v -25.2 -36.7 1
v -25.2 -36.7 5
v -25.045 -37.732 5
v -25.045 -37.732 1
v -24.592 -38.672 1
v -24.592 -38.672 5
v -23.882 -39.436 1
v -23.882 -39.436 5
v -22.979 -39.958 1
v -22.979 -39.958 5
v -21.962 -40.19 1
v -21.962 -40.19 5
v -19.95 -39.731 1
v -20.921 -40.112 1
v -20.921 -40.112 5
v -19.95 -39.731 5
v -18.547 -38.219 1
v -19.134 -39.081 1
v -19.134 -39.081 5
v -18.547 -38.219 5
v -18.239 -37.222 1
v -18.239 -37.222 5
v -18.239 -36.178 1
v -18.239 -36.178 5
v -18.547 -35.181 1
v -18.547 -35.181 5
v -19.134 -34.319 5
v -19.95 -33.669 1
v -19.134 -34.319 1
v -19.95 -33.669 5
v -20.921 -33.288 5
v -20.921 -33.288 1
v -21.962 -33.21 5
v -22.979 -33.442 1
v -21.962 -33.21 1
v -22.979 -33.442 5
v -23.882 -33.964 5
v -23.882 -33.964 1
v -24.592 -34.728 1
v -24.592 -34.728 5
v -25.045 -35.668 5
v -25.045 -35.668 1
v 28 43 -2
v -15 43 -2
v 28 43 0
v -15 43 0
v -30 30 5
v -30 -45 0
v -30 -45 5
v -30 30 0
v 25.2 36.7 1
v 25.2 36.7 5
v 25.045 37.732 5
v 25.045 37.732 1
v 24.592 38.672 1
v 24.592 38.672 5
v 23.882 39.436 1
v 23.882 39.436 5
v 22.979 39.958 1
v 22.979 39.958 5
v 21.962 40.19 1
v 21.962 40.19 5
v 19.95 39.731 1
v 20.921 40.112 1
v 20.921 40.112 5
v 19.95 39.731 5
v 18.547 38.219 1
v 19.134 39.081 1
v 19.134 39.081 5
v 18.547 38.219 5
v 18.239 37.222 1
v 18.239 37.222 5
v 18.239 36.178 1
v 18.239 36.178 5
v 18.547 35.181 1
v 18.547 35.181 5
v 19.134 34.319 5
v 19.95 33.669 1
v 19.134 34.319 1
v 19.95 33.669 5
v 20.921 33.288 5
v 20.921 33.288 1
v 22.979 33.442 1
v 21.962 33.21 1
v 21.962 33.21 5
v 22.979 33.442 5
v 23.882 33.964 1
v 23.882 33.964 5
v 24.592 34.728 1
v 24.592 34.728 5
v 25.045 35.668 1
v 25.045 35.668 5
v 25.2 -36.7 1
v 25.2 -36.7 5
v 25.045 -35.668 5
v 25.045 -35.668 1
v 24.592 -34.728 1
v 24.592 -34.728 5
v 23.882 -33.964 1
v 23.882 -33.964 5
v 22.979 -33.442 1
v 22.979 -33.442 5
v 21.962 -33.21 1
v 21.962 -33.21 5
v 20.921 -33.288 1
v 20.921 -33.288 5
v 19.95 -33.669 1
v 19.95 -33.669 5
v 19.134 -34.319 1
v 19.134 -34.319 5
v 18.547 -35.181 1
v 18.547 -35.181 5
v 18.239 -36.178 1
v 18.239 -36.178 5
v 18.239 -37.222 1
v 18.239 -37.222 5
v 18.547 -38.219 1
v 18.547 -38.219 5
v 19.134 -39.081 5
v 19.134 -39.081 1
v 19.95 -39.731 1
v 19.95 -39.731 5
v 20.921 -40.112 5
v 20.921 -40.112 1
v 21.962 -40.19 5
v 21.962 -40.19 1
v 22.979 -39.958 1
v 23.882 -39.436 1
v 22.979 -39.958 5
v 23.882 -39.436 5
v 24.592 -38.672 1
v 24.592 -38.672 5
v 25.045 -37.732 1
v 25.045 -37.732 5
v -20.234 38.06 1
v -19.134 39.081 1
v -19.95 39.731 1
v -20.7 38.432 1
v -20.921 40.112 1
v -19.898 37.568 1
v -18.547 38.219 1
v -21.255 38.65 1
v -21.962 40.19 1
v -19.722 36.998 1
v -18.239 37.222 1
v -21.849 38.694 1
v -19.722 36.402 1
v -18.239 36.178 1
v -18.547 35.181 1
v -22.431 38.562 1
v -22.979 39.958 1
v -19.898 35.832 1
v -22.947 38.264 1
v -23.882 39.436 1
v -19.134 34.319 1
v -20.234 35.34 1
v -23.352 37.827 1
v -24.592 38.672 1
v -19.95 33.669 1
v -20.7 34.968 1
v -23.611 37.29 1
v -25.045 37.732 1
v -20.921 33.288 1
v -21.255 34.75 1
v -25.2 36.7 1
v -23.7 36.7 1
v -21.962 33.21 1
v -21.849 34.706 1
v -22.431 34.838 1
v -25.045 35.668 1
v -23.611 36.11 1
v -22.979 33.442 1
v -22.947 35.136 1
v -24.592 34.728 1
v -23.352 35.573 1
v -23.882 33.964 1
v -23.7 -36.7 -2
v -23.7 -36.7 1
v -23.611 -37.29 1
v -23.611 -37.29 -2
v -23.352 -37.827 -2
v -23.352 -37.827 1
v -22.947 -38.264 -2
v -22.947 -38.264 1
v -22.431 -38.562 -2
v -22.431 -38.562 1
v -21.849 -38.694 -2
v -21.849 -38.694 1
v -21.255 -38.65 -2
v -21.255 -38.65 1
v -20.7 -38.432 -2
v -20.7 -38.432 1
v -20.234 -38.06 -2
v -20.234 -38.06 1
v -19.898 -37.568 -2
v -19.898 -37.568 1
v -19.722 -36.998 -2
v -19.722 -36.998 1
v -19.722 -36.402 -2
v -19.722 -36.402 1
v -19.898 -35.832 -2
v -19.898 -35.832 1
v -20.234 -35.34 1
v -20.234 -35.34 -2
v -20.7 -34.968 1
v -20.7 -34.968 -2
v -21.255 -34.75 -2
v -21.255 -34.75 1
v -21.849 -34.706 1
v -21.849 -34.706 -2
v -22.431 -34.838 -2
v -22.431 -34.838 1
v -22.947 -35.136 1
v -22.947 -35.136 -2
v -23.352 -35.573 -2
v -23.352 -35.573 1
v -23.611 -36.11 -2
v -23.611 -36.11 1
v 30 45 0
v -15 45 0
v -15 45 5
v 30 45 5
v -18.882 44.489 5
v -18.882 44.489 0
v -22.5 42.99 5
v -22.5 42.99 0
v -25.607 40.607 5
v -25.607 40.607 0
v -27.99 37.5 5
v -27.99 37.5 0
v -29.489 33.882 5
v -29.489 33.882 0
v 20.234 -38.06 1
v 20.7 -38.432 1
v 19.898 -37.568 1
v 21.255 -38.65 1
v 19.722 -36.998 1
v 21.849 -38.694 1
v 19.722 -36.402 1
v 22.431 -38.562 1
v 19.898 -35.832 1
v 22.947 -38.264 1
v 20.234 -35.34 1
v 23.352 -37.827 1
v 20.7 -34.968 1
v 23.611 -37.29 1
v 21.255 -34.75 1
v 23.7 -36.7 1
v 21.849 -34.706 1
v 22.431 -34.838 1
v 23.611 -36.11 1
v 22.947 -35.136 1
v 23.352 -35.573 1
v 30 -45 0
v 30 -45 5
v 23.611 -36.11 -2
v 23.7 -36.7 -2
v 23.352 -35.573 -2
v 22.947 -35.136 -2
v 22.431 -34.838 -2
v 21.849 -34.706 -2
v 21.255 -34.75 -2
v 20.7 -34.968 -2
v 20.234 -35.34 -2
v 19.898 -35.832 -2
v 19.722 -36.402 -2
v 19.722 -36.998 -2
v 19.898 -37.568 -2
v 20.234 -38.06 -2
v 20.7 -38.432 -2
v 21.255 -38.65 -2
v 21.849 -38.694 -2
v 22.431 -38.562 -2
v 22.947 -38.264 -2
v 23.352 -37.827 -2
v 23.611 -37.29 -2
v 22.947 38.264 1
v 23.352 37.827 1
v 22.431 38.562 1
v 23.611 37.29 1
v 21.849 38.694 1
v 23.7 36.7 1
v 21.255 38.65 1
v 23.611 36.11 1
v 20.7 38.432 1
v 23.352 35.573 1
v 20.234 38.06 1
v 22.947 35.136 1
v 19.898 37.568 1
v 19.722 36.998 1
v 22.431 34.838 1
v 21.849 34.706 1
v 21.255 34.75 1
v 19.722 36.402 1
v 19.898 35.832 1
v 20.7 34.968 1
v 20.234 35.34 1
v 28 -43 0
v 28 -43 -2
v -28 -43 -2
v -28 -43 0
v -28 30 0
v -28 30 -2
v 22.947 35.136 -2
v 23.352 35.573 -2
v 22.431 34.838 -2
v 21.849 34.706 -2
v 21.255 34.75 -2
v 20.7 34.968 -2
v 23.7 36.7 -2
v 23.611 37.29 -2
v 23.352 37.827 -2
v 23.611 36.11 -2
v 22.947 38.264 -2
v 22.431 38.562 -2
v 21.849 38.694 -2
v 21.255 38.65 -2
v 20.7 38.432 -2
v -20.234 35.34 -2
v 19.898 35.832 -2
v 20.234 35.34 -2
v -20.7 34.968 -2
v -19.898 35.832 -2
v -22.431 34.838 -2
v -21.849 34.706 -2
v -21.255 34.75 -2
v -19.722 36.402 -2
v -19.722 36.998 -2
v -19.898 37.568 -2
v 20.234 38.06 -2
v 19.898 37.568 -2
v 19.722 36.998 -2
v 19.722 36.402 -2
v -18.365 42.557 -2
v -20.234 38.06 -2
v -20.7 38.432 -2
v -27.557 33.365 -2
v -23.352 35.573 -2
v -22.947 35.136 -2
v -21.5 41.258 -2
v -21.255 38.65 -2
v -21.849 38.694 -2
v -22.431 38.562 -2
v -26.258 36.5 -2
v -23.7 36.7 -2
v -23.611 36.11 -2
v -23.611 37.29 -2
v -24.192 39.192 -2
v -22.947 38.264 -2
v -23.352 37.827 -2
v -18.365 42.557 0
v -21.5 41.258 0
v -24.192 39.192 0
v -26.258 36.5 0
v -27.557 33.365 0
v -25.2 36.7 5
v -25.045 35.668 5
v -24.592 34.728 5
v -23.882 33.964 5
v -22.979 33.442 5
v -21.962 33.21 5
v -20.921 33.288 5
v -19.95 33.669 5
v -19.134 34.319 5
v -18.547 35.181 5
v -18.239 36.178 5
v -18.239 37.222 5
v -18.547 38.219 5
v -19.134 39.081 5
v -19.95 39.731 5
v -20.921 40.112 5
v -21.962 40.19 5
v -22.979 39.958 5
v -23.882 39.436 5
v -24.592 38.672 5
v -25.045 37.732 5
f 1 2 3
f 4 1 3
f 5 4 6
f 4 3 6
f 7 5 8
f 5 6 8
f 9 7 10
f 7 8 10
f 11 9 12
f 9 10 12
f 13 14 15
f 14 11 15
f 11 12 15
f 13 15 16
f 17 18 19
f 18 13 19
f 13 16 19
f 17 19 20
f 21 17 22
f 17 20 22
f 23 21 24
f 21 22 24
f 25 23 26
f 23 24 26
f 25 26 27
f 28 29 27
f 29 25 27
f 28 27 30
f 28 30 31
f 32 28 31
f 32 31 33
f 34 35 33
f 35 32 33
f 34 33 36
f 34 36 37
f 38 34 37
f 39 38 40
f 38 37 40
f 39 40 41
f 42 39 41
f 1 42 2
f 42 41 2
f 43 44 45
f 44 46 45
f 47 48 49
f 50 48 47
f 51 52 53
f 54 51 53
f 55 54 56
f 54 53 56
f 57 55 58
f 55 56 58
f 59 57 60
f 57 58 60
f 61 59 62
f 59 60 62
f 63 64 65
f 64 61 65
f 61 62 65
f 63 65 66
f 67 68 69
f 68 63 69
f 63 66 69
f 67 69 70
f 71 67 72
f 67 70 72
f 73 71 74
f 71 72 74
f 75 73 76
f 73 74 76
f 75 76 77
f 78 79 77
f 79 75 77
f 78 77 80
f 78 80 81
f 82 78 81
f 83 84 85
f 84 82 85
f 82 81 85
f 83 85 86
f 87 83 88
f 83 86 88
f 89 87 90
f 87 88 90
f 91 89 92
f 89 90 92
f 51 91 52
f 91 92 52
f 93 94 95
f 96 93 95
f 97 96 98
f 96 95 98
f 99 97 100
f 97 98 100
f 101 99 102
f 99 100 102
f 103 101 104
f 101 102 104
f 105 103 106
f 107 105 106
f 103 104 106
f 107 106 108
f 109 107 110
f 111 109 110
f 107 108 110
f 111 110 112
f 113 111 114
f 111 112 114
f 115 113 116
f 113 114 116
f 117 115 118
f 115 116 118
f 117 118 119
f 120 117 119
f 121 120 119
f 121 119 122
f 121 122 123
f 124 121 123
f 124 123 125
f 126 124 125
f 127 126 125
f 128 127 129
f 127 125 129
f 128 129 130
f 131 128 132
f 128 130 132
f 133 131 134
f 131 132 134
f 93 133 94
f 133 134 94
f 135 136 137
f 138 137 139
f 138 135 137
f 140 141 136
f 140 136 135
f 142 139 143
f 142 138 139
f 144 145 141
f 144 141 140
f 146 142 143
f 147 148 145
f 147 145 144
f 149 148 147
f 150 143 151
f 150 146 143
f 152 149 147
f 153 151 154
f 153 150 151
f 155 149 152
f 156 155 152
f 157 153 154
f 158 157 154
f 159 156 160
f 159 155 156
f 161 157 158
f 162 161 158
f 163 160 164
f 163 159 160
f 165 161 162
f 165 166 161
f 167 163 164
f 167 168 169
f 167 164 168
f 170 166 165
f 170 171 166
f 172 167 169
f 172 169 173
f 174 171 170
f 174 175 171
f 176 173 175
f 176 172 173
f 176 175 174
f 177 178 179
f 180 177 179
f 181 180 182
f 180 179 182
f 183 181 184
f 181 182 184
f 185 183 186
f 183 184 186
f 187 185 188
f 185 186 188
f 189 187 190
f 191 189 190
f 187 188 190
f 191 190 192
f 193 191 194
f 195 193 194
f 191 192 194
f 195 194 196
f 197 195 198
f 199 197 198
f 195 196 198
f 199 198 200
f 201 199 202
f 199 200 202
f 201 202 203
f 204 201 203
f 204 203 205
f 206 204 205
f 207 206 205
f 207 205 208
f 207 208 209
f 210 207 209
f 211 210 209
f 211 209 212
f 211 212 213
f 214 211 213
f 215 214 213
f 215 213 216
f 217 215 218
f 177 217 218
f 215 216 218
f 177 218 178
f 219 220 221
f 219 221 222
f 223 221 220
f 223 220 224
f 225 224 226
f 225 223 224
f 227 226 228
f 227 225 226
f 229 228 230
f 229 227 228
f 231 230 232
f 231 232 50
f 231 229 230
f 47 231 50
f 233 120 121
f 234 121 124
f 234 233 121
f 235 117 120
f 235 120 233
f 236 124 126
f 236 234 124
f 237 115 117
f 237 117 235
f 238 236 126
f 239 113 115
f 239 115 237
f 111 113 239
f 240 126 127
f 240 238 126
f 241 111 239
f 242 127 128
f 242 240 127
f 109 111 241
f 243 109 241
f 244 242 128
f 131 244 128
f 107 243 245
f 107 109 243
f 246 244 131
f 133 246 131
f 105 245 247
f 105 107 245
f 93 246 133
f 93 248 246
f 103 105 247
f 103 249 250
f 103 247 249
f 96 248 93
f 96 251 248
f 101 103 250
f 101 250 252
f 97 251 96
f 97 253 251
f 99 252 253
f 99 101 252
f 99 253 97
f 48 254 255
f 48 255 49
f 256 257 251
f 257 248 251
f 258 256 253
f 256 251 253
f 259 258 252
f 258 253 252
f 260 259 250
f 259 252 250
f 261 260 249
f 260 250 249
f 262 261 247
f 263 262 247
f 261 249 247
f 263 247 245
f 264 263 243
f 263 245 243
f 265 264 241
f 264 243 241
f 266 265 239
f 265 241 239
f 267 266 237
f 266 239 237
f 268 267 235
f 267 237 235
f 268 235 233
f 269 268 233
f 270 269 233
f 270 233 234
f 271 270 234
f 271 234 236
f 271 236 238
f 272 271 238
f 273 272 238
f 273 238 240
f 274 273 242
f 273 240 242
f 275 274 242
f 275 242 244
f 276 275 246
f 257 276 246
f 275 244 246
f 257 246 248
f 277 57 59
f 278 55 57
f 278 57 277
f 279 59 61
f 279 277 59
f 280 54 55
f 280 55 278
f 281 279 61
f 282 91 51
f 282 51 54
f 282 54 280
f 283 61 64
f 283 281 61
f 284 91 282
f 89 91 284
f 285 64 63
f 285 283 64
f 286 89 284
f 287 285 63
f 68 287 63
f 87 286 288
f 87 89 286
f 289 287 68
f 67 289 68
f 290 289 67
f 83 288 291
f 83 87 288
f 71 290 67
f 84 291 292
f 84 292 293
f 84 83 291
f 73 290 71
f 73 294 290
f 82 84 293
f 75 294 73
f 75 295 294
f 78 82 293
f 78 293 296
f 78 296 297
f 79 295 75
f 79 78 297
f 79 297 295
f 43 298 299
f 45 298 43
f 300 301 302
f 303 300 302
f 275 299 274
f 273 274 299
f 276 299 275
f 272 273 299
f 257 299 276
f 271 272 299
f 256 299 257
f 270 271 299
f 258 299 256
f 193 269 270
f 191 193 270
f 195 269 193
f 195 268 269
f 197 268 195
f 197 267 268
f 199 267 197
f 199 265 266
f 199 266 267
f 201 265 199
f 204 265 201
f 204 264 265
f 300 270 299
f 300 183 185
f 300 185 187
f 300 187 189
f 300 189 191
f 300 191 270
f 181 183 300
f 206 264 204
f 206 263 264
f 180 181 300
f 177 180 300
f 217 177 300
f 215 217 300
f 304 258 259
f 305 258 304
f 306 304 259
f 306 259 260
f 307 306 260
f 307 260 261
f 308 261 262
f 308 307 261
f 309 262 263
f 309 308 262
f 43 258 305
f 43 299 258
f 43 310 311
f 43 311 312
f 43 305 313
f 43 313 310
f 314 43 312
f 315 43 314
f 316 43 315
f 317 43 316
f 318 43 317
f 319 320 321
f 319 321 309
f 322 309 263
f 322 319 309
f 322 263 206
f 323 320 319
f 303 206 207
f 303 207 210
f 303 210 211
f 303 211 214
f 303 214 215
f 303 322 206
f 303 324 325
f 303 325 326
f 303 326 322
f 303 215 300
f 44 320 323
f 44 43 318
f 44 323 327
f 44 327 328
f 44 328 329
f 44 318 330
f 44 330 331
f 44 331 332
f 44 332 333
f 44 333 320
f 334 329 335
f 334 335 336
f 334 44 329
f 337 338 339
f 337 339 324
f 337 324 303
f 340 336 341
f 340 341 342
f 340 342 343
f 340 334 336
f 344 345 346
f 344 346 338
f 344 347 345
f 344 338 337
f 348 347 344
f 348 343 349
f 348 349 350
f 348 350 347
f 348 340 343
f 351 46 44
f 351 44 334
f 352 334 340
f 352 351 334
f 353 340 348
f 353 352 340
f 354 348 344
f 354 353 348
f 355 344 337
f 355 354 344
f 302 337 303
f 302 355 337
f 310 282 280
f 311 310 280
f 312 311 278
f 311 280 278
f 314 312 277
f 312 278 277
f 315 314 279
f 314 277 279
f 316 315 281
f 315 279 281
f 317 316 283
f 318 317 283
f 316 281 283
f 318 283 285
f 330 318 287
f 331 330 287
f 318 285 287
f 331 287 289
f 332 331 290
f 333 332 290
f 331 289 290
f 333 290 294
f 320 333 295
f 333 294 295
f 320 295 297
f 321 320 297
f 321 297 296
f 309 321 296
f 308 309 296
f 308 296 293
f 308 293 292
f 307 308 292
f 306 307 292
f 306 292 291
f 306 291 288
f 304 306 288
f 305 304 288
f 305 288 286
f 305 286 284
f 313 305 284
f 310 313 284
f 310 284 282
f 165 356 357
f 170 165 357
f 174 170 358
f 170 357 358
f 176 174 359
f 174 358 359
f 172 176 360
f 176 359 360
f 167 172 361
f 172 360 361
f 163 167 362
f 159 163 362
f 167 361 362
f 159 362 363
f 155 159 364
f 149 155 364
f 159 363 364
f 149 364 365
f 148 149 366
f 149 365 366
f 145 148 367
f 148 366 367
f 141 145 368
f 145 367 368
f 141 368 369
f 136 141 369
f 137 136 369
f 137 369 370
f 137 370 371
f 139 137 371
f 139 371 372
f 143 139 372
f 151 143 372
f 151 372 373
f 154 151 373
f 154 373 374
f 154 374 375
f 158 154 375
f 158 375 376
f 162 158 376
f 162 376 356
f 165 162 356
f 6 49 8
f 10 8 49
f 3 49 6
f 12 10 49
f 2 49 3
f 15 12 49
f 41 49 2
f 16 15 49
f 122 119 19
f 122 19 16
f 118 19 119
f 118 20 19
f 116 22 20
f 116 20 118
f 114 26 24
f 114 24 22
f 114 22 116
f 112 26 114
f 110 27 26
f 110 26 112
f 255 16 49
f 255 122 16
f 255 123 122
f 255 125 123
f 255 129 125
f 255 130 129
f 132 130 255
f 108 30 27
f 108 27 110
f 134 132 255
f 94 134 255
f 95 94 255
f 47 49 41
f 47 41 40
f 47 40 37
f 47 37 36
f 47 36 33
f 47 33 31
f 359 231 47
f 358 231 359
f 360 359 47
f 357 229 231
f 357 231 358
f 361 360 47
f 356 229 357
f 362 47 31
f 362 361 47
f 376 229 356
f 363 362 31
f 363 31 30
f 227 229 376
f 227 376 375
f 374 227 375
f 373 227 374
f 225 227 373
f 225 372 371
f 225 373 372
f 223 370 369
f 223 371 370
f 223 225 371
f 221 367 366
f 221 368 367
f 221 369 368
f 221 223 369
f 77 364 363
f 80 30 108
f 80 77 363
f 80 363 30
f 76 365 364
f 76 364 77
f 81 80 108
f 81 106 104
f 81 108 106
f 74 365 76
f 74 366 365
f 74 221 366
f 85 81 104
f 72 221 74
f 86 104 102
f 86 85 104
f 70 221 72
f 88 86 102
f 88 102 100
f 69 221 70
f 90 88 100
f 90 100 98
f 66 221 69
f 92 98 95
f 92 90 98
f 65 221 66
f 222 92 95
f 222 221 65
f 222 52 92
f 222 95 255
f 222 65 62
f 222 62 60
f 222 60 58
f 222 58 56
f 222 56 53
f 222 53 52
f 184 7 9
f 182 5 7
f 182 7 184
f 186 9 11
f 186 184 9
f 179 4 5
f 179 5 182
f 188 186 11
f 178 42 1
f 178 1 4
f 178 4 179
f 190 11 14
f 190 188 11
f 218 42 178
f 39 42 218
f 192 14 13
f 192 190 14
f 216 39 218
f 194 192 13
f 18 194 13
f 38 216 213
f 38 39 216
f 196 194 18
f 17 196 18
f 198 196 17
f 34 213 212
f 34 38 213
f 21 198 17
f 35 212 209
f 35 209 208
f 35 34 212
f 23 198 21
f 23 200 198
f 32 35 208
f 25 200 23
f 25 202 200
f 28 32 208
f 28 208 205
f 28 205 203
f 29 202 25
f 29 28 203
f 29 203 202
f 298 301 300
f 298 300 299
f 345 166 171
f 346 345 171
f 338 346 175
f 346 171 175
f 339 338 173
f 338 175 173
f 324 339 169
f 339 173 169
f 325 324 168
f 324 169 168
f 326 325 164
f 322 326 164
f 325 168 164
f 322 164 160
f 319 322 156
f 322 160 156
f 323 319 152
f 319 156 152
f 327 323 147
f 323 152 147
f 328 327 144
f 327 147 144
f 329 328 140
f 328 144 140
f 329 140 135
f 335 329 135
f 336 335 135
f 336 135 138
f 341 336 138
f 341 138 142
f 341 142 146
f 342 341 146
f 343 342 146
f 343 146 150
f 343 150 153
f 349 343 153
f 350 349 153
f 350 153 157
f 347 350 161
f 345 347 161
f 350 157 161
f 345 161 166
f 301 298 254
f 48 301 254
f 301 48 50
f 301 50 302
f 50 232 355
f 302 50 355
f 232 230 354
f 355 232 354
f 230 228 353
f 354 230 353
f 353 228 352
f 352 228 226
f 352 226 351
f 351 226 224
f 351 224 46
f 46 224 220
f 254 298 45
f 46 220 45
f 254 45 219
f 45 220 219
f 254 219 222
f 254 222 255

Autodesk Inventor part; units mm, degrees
ref_plane "YZ Plane" through (0, 0, 0) normal (1, 0, 0) x (0, 1, 0)
ref_plane "XZ Plane" through (0, 0, 0) normal (0, 1, 0) x (-1, 0, 0)
ref_plane "XY Plane" through (0, 0, 0) normal (0, 0, 1) x (1, 0, 0)
sketch "Skizze16" plane through (0, 0, 0) normal (0, 0, 1) x (1, 0, 0)
  line L0 (-30, 45) -> (30, 45)
  line L1 (30, 45) -> (30, -45)
  line L2 (30, -45) -> (-30, -45)
  line L3 (-30, -45) -> (-30, 45)
  line L4 (-30, 45) -> (30, -45) construction
  line L5 (30, 45) -> (-30, -45) construction
  point P0 (0, 0)
  dimension "d50" = 60
  dimension "d51" = 90
extrude "Extrusion13" add sketch "Skizze16" along normal blind 5
fillet "Rundung1" radius 15 1 edges at (-30, 45, 2.5)
sketch "Skizze22" plane through (0, 0, 0) normal (0, 0, -1) x (-1, 0, 0)
  line L0 (30, -45) -> (-30, -45) projected
  line L1 (30, -45) -> (28, -45)
  line L2 (28, -45) -> (28, 30)
  line L3 (28, 30) -> (30, 30)
  line L4 (30, 30) -> (30, -45)
  line L5 (-30, -45) -> (28, -45)
  line L6 (28, -45) -> (28, -43)
  line L7 (28, -43) -> (-30, -43)
  line L8 (-30, -43) -> (-30, -45)
  line L9 (-30, 45) -> (15, 45) projected
  line L10 (-30, -43) -> (-28, -43)
  line L11 (-28, -43) -> (-28, 45)
  line L12 (-28, 45) -> (-30, 45)
  line L13 (-30, 45) -> (-30, -43)
  line L14 (-28, 45) -> (15, 45)
  line L15 (15, 45) -> (15, 43)
  line L16 (15, 43) -> (-28, 43)
  line L17 (-28, 43) -> (-28, 45)
  arc A0 (30, 30) -> (15, 45) centre (15, 30) ccw
  arc A1 (28, 30) -> (15, 43) centre (15, 30) ccw
  point P0 (0, 0)
  dimension "d92" = 2
  dimension "d93" = 75
  dimension "d94" = 2
  dimension "d95" = 2
  dimension "d96" = 2
extrude "Extrusion17" add sketch "Skizze22" along normal blind 2 contours L7 L11 L16 A1 L2
sketch "Skizze23" plane through (0, 0, 5) normal (0, 0, 1) x (1, 0, 0)
  circle A0 centre (21.7, -36.7) radius 2
  line L0 (30, -45) -> (30, 45) projected
  line L1 (-30, -45) -> (30, -45) projected
  point P0 (0, 0)
  dimension "d99" = 4
  dimension "d100" = 8.3
  dimension "d101" = 8.3
extrude "Extrusion18" cut sketch "Skizze23" against normal through all
sketch "Skizze24" plane through (0, 0, 5) normal (0, 0, 1) x (1, 0, 0)
  circle A0 centre (21.7, -36.7) radius 2 projected
  circle A1 centre (21.7, -36.7) radius 3.5
  point P0 (0, 0)
  dimension "d104" = 7
extrude "Extrusion19" cut sketch "Skizze24" against normal blind 4
mirror "Spiegeln5" about plane through (0, 0, 0) normal (0, 1, 0) of "Extrusion19", "Extrusion18"
mirror "Spiegeln6" about plane through (0, 0, 0) normal (1, 0, 0) of "Extrusion19", "Extrusion18", "Spiegeln5"
properties part number "Deckel_Gehäuse"
